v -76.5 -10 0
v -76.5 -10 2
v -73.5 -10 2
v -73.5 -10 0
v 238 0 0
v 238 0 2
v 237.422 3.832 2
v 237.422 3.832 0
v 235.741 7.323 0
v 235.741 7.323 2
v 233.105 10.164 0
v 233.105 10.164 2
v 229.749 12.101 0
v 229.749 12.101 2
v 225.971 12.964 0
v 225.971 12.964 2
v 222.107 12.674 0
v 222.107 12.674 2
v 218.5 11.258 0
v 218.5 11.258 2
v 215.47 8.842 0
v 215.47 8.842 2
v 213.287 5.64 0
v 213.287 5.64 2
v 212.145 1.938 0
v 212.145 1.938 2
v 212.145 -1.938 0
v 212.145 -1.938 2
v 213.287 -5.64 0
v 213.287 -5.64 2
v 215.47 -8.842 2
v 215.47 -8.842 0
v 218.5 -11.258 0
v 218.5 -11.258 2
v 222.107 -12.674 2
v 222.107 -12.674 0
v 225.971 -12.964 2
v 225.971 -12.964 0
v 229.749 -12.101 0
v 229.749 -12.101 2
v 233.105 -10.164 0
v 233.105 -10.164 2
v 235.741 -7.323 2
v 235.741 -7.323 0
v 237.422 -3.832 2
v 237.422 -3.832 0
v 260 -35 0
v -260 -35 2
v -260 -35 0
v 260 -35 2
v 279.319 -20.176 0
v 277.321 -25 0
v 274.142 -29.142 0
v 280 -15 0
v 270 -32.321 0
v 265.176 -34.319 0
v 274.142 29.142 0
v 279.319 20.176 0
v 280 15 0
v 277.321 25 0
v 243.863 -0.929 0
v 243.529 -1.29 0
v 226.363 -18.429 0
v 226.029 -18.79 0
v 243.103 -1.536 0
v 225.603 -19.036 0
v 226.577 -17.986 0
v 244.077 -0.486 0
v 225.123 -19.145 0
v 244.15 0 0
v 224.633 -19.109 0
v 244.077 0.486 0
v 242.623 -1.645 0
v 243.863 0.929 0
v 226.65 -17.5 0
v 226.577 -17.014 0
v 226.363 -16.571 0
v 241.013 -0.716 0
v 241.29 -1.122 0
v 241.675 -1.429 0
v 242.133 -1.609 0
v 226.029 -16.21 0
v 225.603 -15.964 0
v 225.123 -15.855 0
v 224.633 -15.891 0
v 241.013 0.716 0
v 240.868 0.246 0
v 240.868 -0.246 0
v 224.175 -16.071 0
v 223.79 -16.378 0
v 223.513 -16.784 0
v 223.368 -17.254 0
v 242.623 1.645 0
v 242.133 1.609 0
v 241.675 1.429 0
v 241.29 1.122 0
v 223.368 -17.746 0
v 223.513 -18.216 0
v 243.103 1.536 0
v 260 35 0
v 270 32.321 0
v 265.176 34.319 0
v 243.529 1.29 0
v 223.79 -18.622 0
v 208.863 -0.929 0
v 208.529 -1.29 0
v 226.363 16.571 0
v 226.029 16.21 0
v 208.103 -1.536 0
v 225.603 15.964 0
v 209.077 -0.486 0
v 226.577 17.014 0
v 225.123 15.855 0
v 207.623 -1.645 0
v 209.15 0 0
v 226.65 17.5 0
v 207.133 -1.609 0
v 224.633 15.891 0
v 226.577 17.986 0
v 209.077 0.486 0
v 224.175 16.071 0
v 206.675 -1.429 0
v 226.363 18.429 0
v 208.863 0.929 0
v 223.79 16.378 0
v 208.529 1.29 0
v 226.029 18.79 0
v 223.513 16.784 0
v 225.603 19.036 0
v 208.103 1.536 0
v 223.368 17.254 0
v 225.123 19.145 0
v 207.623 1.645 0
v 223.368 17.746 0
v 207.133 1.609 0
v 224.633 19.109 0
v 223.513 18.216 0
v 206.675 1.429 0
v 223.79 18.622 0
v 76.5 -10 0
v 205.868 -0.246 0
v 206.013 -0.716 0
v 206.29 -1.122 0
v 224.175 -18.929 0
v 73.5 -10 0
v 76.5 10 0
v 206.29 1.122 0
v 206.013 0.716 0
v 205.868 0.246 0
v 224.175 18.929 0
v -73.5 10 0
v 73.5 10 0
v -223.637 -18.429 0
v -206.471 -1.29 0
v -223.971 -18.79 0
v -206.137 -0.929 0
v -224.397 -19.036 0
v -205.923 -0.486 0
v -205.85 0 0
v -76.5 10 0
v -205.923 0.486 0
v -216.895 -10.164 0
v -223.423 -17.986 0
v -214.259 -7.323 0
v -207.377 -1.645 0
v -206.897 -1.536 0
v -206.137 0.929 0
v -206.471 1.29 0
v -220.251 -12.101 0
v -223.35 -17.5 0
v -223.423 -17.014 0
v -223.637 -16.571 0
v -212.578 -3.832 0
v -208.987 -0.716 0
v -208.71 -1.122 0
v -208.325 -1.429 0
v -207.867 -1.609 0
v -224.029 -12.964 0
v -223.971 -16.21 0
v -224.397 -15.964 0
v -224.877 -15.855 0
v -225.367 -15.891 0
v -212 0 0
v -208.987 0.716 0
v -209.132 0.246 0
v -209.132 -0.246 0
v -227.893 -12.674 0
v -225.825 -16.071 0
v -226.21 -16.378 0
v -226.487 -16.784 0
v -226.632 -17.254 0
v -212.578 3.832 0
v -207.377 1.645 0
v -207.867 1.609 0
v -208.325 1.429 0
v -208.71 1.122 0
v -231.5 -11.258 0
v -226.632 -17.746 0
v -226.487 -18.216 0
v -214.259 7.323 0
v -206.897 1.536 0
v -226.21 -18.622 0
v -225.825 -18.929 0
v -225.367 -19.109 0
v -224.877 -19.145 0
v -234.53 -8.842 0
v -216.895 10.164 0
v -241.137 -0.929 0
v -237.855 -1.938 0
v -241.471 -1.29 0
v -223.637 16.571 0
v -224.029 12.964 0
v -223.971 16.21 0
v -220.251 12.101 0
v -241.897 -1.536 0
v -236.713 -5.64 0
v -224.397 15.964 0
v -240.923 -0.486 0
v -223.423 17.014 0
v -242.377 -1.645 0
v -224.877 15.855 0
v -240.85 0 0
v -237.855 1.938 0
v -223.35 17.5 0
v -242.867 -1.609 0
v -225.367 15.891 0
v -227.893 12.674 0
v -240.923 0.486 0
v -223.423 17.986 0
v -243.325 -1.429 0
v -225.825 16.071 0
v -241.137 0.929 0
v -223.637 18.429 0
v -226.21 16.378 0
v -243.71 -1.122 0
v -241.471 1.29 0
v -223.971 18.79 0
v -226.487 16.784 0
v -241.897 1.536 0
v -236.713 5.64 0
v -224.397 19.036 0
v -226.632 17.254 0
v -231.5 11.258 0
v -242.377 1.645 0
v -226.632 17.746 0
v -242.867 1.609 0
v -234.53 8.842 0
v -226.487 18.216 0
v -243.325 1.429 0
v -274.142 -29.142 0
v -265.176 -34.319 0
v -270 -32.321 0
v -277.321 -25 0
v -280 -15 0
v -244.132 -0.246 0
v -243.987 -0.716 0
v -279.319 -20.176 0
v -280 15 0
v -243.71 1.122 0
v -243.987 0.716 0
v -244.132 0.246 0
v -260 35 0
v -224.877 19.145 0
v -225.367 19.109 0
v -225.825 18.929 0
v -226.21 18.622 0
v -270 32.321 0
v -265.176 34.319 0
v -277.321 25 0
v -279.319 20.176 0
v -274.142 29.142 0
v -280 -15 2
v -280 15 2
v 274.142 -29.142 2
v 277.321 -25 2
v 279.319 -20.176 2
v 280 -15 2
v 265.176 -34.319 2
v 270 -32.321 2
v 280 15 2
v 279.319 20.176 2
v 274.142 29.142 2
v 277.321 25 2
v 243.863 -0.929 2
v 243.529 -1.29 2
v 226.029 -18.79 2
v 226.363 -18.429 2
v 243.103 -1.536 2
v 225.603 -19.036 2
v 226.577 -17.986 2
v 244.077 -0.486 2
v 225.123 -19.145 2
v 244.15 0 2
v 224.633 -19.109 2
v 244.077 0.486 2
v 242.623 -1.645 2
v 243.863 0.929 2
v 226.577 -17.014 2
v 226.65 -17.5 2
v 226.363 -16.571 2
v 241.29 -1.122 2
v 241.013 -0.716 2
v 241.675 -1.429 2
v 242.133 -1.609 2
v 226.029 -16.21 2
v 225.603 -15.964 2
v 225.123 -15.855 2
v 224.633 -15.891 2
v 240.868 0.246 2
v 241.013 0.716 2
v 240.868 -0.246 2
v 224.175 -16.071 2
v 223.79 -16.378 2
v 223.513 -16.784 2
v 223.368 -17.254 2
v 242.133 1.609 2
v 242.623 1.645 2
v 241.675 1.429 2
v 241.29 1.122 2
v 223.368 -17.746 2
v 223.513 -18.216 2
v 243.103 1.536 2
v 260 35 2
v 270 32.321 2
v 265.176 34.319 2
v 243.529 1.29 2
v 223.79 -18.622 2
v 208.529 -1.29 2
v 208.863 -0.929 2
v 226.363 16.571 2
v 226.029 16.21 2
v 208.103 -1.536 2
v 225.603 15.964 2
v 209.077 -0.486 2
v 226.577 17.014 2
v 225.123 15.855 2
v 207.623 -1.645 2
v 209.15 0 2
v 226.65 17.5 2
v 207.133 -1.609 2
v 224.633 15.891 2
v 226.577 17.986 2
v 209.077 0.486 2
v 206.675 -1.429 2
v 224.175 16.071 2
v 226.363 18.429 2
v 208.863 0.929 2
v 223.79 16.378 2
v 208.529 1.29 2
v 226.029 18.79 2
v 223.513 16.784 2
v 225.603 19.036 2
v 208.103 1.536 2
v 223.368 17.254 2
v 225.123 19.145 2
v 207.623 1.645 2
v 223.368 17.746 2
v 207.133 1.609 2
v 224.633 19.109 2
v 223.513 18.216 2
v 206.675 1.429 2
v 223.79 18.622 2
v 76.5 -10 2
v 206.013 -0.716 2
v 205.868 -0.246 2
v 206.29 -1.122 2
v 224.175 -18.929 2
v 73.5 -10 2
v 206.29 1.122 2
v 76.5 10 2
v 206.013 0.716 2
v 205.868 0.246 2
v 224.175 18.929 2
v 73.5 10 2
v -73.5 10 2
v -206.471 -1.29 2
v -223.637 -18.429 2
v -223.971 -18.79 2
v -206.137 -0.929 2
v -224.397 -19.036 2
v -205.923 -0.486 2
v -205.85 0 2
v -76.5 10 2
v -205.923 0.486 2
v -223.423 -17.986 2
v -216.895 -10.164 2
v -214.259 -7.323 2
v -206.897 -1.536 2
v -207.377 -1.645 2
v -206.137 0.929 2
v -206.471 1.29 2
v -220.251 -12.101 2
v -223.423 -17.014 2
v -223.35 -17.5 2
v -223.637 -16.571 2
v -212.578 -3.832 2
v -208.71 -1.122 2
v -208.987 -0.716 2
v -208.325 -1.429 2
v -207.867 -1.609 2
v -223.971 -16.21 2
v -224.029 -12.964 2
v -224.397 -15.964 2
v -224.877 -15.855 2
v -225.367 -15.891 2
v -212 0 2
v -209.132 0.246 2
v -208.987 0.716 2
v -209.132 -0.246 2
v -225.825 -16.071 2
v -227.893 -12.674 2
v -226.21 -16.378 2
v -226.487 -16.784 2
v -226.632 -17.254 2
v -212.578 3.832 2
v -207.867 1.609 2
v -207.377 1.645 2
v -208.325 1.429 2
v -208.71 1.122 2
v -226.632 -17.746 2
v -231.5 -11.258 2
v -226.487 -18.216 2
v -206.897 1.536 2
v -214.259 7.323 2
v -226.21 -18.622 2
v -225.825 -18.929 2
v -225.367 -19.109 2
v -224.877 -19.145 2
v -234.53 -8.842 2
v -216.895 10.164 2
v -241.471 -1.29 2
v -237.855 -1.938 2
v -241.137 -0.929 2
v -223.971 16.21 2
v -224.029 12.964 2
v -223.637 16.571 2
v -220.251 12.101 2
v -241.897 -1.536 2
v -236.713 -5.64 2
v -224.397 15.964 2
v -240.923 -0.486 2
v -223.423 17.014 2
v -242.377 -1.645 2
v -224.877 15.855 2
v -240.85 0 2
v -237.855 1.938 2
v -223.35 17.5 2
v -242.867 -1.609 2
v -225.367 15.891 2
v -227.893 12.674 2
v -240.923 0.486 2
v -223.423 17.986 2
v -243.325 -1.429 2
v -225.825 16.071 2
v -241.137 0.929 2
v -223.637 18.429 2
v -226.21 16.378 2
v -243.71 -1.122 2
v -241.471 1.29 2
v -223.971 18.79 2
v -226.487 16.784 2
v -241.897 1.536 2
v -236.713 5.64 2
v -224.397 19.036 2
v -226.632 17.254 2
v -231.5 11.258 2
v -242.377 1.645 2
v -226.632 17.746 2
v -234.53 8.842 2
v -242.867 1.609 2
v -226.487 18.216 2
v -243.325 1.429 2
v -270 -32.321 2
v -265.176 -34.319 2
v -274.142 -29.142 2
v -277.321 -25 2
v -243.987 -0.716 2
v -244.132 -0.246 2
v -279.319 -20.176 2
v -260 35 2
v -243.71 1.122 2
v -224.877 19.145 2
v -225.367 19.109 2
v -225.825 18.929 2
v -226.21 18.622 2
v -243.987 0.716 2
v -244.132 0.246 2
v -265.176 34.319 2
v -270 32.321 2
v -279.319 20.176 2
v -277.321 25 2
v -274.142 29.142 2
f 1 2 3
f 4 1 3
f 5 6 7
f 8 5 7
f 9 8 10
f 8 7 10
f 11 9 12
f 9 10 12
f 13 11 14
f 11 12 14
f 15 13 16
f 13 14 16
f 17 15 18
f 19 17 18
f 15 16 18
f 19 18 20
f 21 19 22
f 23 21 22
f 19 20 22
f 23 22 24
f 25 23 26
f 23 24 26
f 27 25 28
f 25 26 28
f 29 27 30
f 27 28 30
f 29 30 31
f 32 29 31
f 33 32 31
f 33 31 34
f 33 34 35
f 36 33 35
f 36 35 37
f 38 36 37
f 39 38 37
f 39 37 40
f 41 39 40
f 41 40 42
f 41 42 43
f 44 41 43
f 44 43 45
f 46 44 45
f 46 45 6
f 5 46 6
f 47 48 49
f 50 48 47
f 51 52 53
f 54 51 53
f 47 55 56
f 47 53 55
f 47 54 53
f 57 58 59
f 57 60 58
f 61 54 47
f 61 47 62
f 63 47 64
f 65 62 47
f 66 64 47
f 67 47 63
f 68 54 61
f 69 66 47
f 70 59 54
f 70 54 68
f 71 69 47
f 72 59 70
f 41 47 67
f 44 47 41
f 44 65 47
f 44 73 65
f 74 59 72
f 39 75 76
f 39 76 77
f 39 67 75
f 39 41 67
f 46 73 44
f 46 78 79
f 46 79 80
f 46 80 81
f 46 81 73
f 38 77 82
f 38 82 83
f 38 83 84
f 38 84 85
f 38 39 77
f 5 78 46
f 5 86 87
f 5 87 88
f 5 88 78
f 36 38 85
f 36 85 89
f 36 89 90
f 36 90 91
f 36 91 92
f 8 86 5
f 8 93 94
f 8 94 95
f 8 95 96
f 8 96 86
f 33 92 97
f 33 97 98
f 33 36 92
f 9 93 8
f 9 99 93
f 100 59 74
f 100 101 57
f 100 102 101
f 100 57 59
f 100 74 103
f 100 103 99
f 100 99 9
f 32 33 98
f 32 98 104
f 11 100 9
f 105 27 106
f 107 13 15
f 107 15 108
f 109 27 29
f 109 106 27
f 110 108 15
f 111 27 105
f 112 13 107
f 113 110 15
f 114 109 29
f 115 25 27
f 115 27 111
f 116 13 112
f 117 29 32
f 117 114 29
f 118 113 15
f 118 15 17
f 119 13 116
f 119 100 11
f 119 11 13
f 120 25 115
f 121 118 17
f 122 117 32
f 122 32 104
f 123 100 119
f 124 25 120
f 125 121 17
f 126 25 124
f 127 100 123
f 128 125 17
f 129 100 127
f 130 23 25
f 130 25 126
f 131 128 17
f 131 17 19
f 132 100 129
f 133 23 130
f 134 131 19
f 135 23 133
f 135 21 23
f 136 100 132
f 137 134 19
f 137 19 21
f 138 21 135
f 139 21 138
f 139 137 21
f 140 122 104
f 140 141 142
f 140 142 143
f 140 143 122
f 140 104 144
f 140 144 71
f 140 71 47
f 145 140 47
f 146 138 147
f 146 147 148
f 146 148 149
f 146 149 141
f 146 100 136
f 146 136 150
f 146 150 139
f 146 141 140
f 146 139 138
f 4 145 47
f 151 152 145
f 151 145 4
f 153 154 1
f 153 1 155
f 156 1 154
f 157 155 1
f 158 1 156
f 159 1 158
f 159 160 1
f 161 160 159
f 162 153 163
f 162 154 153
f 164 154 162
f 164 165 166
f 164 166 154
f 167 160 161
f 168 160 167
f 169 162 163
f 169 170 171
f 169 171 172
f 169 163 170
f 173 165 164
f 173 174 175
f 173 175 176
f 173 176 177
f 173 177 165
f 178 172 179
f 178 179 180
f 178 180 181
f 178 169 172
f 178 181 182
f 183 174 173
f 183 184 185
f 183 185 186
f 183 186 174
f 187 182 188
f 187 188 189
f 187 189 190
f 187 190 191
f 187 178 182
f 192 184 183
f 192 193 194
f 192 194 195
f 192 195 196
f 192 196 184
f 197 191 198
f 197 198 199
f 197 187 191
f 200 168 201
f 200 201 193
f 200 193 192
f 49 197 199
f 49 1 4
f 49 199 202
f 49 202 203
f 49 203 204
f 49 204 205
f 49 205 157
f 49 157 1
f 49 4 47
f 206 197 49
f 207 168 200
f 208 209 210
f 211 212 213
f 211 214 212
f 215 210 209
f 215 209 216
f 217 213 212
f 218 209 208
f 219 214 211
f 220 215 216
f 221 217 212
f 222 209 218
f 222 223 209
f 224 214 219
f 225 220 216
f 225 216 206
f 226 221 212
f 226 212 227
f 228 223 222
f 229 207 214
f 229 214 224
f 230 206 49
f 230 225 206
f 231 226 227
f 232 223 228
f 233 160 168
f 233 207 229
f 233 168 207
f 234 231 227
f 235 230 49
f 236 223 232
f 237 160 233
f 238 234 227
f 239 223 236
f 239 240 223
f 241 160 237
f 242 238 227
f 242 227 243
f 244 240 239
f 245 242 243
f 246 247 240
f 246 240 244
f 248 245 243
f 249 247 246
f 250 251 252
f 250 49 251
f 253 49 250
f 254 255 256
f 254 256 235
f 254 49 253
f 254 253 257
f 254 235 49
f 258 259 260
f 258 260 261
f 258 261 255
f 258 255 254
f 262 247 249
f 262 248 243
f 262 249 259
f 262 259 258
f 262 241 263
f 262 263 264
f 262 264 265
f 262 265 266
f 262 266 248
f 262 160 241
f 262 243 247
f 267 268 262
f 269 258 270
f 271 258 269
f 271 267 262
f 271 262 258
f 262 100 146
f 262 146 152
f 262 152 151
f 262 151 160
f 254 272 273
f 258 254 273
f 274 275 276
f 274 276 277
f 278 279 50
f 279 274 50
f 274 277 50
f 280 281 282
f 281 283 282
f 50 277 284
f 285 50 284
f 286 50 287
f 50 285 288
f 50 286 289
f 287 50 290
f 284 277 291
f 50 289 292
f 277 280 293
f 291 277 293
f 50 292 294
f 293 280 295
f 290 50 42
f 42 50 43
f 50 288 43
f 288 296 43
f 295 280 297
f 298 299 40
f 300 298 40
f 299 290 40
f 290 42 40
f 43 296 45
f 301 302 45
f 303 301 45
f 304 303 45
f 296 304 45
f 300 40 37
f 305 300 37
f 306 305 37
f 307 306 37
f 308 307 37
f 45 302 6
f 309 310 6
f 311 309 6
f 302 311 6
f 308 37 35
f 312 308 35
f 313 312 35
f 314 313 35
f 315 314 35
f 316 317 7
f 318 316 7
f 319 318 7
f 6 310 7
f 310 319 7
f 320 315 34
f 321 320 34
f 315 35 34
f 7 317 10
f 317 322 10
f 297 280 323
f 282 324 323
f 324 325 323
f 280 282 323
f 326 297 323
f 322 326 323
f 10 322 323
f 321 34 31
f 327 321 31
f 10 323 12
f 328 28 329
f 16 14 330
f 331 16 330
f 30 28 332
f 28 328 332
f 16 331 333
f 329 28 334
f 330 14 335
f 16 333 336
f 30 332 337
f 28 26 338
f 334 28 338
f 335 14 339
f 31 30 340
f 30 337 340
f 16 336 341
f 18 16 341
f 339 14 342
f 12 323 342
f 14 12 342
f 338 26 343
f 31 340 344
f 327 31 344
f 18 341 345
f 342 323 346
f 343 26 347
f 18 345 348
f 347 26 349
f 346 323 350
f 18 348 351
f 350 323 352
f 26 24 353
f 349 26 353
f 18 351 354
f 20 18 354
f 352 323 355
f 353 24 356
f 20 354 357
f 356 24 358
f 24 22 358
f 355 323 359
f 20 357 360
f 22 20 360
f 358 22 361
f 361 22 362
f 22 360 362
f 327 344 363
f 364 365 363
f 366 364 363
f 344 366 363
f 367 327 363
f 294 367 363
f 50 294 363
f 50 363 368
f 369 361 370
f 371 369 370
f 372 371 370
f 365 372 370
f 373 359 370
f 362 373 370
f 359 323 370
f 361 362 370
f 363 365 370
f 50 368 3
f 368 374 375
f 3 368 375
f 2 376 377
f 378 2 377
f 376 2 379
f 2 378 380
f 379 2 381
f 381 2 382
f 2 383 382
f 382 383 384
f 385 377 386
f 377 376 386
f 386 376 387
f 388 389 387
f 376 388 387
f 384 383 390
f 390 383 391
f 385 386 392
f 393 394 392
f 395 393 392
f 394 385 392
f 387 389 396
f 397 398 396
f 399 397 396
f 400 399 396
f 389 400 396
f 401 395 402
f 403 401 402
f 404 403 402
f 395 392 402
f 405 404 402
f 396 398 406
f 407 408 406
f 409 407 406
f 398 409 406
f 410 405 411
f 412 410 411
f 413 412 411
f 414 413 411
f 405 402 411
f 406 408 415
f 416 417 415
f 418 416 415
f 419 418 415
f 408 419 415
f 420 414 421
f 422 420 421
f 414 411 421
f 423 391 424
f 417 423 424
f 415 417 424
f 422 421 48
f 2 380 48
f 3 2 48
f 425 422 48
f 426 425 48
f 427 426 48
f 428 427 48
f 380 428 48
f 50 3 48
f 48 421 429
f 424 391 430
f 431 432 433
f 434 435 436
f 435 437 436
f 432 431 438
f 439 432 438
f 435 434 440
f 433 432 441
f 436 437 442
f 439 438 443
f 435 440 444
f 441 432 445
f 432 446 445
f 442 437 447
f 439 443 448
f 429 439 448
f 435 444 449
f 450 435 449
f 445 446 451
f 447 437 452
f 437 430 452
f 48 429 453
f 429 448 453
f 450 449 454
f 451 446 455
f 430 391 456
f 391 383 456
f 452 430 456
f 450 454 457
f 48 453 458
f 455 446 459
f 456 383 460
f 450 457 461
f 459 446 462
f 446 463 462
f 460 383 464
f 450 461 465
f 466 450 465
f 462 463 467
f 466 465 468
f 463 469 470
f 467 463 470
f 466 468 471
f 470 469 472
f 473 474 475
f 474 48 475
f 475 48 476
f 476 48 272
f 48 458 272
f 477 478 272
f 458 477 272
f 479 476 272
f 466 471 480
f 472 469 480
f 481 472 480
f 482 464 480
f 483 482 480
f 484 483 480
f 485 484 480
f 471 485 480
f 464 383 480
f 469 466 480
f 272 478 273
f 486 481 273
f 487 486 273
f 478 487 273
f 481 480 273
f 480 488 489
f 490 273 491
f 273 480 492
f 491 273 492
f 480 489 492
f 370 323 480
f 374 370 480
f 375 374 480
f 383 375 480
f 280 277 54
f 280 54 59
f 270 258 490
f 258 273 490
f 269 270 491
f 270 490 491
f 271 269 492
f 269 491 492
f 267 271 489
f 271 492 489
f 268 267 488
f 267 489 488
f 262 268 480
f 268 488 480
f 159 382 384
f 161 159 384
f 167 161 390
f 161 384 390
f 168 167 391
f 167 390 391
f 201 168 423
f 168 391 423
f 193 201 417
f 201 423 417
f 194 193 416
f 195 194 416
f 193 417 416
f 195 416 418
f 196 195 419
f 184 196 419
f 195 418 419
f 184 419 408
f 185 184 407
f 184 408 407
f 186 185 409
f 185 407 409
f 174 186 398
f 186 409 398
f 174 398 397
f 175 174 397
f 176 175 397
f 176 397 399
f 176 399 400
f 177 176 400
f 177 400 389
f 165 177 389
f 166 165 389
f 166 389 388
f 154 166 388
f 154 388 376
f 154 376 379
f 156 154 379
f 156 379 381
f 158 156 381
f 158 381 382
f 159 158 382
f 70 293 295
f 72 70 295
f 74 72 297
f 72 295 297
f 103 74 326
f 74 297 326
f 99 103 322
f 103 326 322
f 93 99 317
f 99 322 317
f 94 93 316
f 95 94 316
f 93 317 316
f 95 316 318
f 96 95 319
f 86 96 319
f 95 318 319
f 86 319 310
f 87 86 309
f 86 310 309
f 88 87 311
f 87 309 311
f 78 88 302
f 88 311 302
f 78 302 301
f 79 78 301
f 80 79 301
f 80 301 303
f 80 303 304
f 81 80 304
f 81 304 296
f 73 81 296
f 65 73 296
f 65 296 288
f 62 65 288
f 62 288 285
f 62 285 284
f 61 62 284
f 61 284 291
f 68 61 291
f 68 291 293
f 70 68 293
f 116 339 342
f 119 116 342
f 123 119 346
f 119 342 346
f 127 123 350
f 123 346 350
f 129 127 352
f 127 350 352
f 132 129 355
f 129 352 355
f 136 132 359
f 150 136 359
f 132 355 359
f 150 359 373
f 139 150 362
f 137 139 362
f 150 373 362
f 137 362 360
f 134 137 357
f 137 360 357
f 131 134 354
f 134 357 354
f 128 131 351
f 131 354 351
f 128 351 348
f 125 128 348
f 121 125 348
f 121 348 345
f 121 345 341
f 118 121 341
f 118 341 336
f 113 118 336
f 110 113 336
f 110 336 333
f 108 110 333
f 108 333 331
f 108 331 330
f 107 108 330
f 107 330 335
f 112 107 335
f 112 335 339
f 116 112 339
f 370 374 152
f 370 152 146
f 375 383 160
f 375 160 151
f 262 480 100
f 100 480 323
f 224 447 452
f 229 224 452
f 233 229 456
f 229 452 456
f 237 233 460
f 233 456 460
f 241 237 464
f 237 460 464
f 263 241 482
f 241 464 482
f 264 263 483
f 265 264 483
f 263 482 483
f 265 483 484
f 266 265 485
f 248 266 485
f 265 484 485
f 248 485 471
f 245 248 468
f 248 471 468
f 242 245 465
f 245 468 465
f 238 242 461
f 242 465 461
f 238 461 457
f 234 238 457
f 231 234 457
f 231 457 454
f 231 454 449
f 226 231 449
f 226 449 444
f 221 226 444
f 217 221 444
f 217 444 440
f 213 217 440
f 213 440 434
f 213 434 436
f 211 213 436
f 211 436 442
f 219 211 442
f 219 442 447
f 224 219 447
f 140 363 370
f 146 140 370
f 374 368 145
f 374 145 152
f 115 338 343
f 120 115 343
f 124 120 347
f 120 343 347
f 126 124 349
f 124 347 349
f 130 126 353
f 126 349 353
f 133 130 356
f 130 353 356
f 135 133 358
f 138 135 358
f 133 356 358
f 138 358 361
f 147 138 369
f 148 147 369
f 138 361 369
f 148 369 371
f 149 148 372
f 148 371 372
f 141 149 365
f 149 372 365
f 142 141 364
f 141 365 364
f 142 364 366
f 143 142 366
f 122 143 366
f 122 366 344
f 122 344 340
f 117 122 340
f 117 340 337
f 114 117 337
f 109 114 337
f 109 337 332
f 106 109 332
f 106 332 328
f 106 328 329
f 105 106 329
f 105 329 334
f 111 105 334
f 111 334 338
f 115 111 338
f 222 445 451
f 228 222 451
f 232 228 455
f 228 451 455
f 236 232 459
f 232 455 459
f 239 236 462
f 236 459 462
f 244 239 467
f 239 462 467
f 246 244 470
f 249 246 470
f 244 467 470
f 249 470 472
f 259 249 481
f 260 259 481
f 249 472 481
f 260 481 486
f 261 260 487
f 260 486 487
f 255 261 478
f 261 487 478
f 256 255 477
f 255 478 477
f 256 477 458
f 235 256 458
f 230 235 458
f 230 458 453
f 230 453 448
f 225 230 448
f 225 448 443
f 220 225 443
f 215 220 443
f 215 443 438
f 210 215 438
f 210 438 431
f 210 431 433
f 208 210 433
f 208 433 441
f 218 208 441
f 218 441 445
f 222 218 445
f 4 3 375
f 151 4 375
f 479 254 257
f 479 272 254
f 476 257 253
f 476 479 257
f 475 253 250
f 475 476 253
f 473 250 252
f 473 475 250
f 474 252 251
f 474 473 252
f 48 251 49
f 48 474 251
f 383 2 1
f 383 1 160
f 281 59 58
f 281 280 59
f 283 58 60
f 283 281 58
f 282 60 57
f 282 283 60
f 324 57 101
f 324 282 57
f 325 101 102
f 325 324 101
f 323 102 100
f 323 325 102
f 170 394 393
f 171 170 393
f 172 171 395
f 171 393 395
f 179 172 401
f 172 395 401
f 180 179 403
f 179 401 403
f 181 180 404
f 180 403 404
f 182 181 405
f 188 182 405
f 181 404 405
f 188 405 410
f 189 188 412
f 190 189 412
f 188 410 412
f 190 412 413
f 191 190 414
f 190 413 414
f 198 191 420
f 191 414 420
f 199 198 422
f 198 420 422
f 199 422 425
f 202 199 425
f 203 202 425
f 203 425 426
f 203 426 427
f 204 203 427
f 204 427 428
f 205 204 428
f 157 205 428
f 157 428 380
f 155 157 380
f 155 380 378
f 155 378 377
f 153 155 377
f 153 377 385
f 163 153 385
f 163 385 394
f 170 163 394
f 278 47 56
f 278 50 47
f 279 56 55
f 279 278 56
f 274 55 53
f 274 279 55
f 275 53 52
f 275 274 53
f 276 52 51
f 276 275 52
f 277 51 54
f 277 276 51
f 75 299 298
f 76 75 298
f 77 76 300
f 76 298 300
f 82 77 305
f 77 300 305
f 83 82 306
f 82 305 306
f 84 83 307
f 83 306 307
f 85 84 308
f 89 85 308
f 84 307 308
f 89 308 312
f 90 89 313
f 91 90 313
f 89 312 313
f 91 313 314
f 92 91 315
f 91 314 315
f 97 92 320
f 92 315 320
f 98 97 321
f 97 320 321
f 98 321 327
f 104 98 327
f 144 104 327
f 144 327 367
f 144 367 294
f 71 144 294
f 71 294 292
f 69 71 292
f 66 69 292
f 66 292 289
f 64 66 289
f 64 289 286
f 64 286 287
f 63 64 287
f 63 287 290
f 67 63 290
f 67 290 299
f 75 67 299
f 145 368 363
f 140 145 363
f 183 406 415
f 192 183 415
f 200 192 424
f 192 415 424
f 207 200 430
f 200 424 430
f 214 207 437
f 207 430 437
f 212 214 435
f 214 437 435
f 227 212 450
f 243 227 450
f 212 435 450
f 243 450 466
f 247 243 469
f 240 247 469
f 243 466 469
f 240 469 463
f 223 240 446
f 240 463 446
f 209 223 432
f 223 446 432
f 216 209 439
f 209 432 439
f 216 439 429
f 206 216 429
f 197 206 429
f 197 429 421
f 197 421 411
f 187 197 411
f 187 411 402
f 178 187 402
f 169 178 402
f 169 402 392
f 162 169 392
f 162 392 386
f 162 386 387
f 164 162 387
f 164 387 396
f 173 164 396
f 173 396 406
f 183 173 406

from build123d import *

# Parameters (mm, degrees)
EXTRUDE_1_DEPTH      = 2
CUT_EXTRUDE_1_REACH  = 306.145
SKETCH_3_R           = 13
SKETCH_3_R_2         = 1.65
SKETCH_6_OUTSIDE_W   = 723.656
SKETCH_6_OUTSIDE_H   = 223.656
SKETCH_6_OUTSIDE_W_2 = 773.893791272
SKETCH_6_OUTSIDE_H_2 = 70
CUT_EXTRUDE_4_DEPTH  = 10
SKETCH_7_W           = 40
SKETCH_7_H           = 125.252157634
SKETCH_7_H_2         = 116.31531122
CUT_EXTRUDE_5_DEPTH  = 10
FILLET_1_R           = 20
SKETCH_10_W          = 3
SKETCH_10_H          = 20
CUT_EXTRUDE_6_DEPTH  = 10


with BuildPart() as part:
    # 草图2 → 凸台-拉伸1 (new body)
    with BuildSketch(Plane.XY):
        with BuildLine():
            Line((-280, 50), (280, 50))
            ThreePointArc((280, 50), (294.142135624, 44.142135624), (300, 30))
            Line((300, 30), (300, -30))
            ThreePointArc((300, -30), (294.142135624, -44.142135624), (280, -50))
            Line((280, -50), (-280, -50))
            ThreePointArc((-280, -50), (-294.142135624, -44.142135624), (-300, -30))
            Line((-300, -30), (-300, 30))
            ThreePointArc((-300, 30), (-294.142135624, 44.142135624), (-280, 50))
        make_face()
    extrude(amount=EXTRUDE_1_DEPTH)

    # 草图3 → 切除-拉伸1 (cut, up to next)
    with BuildSketch(Plane.XY.offset(2), mode=Mode.PRIVATE) as cut_extrude_1_sk1:
        with Locations((-225, 0)):
            Circle(SKETCH_3_R)
    cut_extrude_1_tool1 = extrude(cut_extrude_1_sk1.sketch, amount=-CUT_EXTRUDE_1_REACH, mode=Mode.PRIVATE) & part.part
    # 草图3 → 切除-拉伸1 (cut, up to next)
    with BuildSketch(Plane.XY.offset(2), mode=Mode.PRIVATE) as cut_extrude_1_sk2:
        with Locations((225, 0)):
            Circle(SKETCH_3_R)
    cut_extrude_1_tool2 = extrude(cut_extrude_1_sk2.sketch, amount=-CUT_EXTRUDE_1_REACH, mode=Mode.PRIVATE) & part.part
    # 草图3 → 切除-拉伸1 (cut, up to next)
    with BuildSketch(Plane.XY.offset(2), mode=Mode.PRIVATE) as cut_extrude_1_sk3:
        with Locations((-242.5, 0)):
            Circle(SKETCH_3_R_2)
    cut_extrude_1_tool3 = extrude(cut_extrude_1_sk3.sketch, amount=-CUT_EXTRUDE_1_REACH, mode=Mode.PRIVATE) & part.part
    # 草图3 → 切除-拉伸1 (cut, up to next)
    with BuildSketch(Plane.XY.offset(2), mode=Mode.PRIVATE) as cut_extrude_1_sk4:
        with Locations((-207.5, 0)):
            Circle(SKETCH_3_R_2)
    cut_extrude_1_tool4 = extrude(cut_extrude_1_sk4.sketch, amount=-CUT_EXTRUDE_1_REACH, mode=Mode.PRIVATE) & part.part
    # 草图3 → 切除-拉伸1 (cut, up to next)
    with BuildSketch(Plane.XY.offset(2), mode=Mode.PRIVATE) as cut_extrude_1_sk5:
        with Locations((-225, 17.5)):
            Circle(SKETCH_3_R_2)
    cut_extrude_1_tool5 = extrude(cut_extrude_1_sk5.sketch, amount=-CUT_EXTRUDE_1_REACH, mode=Mode.PRIVATE) & part.part
    # 草图3 → 切除-拉伸1 (cut, up to next)
    with BuildSketch(Plane.XY.offset(2), mode=Mode.PRIVATE) as cut_extrude_1_sk6:
        with Locations((-225, -17.5)):
            Circle(SKETCH_3_R_2)
    cut_extrude_1_tool6 = extrude(cut_extrude_1_sk6.sketch, amount=-CUT_EXTRUDE_1_REACH, mode=Mode.PRIVATE) & part.part
    # 草图3 → 切除-拉伸1 (cut, up to next)
    with BuildSketch(Plane.XY.offset(2), mode=Mode.PRIVATE) as cut_extrude_1_sk7:
        with Locations((242.5, 0)):
            Circle(SKETCH_3_R_2)
    cut_extrude_1_tool7 = extrude(cut_extrude_1_sk7.sketch, amount=-CUT_EXTRUDE_1_REACH, mode=Mode.PRIVATE) & part.part
    # 草图3 → 切除-拉伸1 (cut, up to next)
    with BuildSketch(Plane.XY.offset(2), mode=Mode.PRIVATE) as cut_extrude_1_sk8:
        with Locations((225, 17.5)):
            Circle(SKETCH_3_R_2)
    cut_extrude_1_tool8 = extrude(cut_extrude_1_sk8.sketch, amount=-CUT_EXTRUDE_1_REACH, mode=Mode.PRIVATE) & part.part
    # 草图3 → 切除-拉伸1 (cut, up to next)
    with BuildSketch(Plane.XY.offset(2), mode=Mode.PRIVATE) as cut_extrude_1_sk9:
        with Locations((207.5, 0)):
            Circle(SKETCH_3_R_2)
    cut_extrude_1_tool9 = extrude(cut_extrude_1_sk9.sketch, amount=-CUT_EXTRUDE_1_REACH, mode=Mode.PRIVATE) & part.part
    # 草图3 → 切除-拉伸1 (cut, up to next)
    with BuildSketch(Plane.XY.offset(2), mode=Mode.PRIVATE) as cut_extrude_1_sk10:
        with Locations((225, -17.5)):
            Circle(SKETCH_3_R_2)
    cut_extrude_1_tool10 = extrude(cut_extrude_1_sk10.sketch, amount=-CUT_EXTRUDE_1_REACH, mode=Mode.PRIVATE) & part.part
    add(cut_extrude_1_tool1.solids().sort_by_distance((-225, 0, 2))[0], mode=Mode.SUBTRACT)
    add(cut_extrude_1_tool2.solids().sort_by_distance((225, 0, 2))[0], mode=Mode.SUBTRACT)
    add(cut_extrude_1_tool3.solids().sort_by_distance((-242.5, 0, 2))[0], mode=Mode.SUBTRACT)
    add(cut_extrude_1_tool4.solids().sort_by_distance((-207.5, 0, 2))[0], mode=Mode.SUBTRACT)
    add(cut_extrude_1_tool5.solids().sort_by_distance((-225, 17.5, 2))[0], mode=Mode.SUBTRACT)
    add(cut_extrude_1_tool6.solids().sort_by_distance((-225, -17.5, 2))[0], mode=Mode.SUBTRACT)
    add(cut_extrude_1_tool7.solids().sort_by_distance((242.5, 0, 2))[0], mode=Mode.SUBTRACT)
    add(cut_extrude_1_tool8.solids().sort_by_distance((225, 17.5, 2))[0], mode=Mode.SUBTRACT)
    add(cut_extrude_1_tool9.solids().sort_by_distance((207.5, 0, 2))[0], mode=Mode.SUBTRACT)
    add(cut_extrude_1_tool10.solids().sort_by_distance((225, -17.5, 2))[0], mode=Mode.SUBTRACT)

    # 草图6 outside → 切除-拉伸4 (cut)
    with BuildSketch(Plane.XY.offset(2)):
        Rectangle(SKETCH_6_OUTSIDE_W, SKETCH_6_OUTSIDE_H)
        Rectangle(SKETCH_6_OUTSIDE_W_2, SKETCH_6_OUTSIDE_H_2, mode=Mode.SUBTRACT)
    extrude(amount=-CUT_EXTRUDE_4_DEPTH, mode=Mode.SUBTRACT)

    # 草图7 → 切除-拉伸5 (cut)
    with BuildSketch(Plane.XY.offset(2)):
        with Locations((-300, 0)):
            Rectangle(SKETCH_7_W, SKETCH_7_H)
        with Locations((300, 0)):
            Rectangle(SKETCH_7_W, SKETCH_7_H_2)
    extrude(amount=-CUT_EXTRUDE_5_DEPTH, mode=Mode.SUBTRACT)

    # 圆角1
    fillet_1_edges = [part.edges().sort_by_distance(p)[0] for p in [
        (-280, 35, 1),
        (-280, -35, 1),
        (280, 35, 1),
        (280, -35, 1),
    ]]
    fillet(fillet_1_edges, radius=FILLET_1_R)

    # 草图10 → 切除-拉伸6 (cut)
    with BuildSketch(Plane.XY.offset(2)):
        with Locations((-75, 0)):
            Rectangle(SKETCH_10_W, SKETCH_10_H)
        with Locations((75, 0)):
            Rectangle(SKETCH_10_W, SKETCH_10_H)
    extrude(amount=-CUT_EXTRUDE_6_DEPTH, mode=Mode.SUBTRACT)


solid = part.part
